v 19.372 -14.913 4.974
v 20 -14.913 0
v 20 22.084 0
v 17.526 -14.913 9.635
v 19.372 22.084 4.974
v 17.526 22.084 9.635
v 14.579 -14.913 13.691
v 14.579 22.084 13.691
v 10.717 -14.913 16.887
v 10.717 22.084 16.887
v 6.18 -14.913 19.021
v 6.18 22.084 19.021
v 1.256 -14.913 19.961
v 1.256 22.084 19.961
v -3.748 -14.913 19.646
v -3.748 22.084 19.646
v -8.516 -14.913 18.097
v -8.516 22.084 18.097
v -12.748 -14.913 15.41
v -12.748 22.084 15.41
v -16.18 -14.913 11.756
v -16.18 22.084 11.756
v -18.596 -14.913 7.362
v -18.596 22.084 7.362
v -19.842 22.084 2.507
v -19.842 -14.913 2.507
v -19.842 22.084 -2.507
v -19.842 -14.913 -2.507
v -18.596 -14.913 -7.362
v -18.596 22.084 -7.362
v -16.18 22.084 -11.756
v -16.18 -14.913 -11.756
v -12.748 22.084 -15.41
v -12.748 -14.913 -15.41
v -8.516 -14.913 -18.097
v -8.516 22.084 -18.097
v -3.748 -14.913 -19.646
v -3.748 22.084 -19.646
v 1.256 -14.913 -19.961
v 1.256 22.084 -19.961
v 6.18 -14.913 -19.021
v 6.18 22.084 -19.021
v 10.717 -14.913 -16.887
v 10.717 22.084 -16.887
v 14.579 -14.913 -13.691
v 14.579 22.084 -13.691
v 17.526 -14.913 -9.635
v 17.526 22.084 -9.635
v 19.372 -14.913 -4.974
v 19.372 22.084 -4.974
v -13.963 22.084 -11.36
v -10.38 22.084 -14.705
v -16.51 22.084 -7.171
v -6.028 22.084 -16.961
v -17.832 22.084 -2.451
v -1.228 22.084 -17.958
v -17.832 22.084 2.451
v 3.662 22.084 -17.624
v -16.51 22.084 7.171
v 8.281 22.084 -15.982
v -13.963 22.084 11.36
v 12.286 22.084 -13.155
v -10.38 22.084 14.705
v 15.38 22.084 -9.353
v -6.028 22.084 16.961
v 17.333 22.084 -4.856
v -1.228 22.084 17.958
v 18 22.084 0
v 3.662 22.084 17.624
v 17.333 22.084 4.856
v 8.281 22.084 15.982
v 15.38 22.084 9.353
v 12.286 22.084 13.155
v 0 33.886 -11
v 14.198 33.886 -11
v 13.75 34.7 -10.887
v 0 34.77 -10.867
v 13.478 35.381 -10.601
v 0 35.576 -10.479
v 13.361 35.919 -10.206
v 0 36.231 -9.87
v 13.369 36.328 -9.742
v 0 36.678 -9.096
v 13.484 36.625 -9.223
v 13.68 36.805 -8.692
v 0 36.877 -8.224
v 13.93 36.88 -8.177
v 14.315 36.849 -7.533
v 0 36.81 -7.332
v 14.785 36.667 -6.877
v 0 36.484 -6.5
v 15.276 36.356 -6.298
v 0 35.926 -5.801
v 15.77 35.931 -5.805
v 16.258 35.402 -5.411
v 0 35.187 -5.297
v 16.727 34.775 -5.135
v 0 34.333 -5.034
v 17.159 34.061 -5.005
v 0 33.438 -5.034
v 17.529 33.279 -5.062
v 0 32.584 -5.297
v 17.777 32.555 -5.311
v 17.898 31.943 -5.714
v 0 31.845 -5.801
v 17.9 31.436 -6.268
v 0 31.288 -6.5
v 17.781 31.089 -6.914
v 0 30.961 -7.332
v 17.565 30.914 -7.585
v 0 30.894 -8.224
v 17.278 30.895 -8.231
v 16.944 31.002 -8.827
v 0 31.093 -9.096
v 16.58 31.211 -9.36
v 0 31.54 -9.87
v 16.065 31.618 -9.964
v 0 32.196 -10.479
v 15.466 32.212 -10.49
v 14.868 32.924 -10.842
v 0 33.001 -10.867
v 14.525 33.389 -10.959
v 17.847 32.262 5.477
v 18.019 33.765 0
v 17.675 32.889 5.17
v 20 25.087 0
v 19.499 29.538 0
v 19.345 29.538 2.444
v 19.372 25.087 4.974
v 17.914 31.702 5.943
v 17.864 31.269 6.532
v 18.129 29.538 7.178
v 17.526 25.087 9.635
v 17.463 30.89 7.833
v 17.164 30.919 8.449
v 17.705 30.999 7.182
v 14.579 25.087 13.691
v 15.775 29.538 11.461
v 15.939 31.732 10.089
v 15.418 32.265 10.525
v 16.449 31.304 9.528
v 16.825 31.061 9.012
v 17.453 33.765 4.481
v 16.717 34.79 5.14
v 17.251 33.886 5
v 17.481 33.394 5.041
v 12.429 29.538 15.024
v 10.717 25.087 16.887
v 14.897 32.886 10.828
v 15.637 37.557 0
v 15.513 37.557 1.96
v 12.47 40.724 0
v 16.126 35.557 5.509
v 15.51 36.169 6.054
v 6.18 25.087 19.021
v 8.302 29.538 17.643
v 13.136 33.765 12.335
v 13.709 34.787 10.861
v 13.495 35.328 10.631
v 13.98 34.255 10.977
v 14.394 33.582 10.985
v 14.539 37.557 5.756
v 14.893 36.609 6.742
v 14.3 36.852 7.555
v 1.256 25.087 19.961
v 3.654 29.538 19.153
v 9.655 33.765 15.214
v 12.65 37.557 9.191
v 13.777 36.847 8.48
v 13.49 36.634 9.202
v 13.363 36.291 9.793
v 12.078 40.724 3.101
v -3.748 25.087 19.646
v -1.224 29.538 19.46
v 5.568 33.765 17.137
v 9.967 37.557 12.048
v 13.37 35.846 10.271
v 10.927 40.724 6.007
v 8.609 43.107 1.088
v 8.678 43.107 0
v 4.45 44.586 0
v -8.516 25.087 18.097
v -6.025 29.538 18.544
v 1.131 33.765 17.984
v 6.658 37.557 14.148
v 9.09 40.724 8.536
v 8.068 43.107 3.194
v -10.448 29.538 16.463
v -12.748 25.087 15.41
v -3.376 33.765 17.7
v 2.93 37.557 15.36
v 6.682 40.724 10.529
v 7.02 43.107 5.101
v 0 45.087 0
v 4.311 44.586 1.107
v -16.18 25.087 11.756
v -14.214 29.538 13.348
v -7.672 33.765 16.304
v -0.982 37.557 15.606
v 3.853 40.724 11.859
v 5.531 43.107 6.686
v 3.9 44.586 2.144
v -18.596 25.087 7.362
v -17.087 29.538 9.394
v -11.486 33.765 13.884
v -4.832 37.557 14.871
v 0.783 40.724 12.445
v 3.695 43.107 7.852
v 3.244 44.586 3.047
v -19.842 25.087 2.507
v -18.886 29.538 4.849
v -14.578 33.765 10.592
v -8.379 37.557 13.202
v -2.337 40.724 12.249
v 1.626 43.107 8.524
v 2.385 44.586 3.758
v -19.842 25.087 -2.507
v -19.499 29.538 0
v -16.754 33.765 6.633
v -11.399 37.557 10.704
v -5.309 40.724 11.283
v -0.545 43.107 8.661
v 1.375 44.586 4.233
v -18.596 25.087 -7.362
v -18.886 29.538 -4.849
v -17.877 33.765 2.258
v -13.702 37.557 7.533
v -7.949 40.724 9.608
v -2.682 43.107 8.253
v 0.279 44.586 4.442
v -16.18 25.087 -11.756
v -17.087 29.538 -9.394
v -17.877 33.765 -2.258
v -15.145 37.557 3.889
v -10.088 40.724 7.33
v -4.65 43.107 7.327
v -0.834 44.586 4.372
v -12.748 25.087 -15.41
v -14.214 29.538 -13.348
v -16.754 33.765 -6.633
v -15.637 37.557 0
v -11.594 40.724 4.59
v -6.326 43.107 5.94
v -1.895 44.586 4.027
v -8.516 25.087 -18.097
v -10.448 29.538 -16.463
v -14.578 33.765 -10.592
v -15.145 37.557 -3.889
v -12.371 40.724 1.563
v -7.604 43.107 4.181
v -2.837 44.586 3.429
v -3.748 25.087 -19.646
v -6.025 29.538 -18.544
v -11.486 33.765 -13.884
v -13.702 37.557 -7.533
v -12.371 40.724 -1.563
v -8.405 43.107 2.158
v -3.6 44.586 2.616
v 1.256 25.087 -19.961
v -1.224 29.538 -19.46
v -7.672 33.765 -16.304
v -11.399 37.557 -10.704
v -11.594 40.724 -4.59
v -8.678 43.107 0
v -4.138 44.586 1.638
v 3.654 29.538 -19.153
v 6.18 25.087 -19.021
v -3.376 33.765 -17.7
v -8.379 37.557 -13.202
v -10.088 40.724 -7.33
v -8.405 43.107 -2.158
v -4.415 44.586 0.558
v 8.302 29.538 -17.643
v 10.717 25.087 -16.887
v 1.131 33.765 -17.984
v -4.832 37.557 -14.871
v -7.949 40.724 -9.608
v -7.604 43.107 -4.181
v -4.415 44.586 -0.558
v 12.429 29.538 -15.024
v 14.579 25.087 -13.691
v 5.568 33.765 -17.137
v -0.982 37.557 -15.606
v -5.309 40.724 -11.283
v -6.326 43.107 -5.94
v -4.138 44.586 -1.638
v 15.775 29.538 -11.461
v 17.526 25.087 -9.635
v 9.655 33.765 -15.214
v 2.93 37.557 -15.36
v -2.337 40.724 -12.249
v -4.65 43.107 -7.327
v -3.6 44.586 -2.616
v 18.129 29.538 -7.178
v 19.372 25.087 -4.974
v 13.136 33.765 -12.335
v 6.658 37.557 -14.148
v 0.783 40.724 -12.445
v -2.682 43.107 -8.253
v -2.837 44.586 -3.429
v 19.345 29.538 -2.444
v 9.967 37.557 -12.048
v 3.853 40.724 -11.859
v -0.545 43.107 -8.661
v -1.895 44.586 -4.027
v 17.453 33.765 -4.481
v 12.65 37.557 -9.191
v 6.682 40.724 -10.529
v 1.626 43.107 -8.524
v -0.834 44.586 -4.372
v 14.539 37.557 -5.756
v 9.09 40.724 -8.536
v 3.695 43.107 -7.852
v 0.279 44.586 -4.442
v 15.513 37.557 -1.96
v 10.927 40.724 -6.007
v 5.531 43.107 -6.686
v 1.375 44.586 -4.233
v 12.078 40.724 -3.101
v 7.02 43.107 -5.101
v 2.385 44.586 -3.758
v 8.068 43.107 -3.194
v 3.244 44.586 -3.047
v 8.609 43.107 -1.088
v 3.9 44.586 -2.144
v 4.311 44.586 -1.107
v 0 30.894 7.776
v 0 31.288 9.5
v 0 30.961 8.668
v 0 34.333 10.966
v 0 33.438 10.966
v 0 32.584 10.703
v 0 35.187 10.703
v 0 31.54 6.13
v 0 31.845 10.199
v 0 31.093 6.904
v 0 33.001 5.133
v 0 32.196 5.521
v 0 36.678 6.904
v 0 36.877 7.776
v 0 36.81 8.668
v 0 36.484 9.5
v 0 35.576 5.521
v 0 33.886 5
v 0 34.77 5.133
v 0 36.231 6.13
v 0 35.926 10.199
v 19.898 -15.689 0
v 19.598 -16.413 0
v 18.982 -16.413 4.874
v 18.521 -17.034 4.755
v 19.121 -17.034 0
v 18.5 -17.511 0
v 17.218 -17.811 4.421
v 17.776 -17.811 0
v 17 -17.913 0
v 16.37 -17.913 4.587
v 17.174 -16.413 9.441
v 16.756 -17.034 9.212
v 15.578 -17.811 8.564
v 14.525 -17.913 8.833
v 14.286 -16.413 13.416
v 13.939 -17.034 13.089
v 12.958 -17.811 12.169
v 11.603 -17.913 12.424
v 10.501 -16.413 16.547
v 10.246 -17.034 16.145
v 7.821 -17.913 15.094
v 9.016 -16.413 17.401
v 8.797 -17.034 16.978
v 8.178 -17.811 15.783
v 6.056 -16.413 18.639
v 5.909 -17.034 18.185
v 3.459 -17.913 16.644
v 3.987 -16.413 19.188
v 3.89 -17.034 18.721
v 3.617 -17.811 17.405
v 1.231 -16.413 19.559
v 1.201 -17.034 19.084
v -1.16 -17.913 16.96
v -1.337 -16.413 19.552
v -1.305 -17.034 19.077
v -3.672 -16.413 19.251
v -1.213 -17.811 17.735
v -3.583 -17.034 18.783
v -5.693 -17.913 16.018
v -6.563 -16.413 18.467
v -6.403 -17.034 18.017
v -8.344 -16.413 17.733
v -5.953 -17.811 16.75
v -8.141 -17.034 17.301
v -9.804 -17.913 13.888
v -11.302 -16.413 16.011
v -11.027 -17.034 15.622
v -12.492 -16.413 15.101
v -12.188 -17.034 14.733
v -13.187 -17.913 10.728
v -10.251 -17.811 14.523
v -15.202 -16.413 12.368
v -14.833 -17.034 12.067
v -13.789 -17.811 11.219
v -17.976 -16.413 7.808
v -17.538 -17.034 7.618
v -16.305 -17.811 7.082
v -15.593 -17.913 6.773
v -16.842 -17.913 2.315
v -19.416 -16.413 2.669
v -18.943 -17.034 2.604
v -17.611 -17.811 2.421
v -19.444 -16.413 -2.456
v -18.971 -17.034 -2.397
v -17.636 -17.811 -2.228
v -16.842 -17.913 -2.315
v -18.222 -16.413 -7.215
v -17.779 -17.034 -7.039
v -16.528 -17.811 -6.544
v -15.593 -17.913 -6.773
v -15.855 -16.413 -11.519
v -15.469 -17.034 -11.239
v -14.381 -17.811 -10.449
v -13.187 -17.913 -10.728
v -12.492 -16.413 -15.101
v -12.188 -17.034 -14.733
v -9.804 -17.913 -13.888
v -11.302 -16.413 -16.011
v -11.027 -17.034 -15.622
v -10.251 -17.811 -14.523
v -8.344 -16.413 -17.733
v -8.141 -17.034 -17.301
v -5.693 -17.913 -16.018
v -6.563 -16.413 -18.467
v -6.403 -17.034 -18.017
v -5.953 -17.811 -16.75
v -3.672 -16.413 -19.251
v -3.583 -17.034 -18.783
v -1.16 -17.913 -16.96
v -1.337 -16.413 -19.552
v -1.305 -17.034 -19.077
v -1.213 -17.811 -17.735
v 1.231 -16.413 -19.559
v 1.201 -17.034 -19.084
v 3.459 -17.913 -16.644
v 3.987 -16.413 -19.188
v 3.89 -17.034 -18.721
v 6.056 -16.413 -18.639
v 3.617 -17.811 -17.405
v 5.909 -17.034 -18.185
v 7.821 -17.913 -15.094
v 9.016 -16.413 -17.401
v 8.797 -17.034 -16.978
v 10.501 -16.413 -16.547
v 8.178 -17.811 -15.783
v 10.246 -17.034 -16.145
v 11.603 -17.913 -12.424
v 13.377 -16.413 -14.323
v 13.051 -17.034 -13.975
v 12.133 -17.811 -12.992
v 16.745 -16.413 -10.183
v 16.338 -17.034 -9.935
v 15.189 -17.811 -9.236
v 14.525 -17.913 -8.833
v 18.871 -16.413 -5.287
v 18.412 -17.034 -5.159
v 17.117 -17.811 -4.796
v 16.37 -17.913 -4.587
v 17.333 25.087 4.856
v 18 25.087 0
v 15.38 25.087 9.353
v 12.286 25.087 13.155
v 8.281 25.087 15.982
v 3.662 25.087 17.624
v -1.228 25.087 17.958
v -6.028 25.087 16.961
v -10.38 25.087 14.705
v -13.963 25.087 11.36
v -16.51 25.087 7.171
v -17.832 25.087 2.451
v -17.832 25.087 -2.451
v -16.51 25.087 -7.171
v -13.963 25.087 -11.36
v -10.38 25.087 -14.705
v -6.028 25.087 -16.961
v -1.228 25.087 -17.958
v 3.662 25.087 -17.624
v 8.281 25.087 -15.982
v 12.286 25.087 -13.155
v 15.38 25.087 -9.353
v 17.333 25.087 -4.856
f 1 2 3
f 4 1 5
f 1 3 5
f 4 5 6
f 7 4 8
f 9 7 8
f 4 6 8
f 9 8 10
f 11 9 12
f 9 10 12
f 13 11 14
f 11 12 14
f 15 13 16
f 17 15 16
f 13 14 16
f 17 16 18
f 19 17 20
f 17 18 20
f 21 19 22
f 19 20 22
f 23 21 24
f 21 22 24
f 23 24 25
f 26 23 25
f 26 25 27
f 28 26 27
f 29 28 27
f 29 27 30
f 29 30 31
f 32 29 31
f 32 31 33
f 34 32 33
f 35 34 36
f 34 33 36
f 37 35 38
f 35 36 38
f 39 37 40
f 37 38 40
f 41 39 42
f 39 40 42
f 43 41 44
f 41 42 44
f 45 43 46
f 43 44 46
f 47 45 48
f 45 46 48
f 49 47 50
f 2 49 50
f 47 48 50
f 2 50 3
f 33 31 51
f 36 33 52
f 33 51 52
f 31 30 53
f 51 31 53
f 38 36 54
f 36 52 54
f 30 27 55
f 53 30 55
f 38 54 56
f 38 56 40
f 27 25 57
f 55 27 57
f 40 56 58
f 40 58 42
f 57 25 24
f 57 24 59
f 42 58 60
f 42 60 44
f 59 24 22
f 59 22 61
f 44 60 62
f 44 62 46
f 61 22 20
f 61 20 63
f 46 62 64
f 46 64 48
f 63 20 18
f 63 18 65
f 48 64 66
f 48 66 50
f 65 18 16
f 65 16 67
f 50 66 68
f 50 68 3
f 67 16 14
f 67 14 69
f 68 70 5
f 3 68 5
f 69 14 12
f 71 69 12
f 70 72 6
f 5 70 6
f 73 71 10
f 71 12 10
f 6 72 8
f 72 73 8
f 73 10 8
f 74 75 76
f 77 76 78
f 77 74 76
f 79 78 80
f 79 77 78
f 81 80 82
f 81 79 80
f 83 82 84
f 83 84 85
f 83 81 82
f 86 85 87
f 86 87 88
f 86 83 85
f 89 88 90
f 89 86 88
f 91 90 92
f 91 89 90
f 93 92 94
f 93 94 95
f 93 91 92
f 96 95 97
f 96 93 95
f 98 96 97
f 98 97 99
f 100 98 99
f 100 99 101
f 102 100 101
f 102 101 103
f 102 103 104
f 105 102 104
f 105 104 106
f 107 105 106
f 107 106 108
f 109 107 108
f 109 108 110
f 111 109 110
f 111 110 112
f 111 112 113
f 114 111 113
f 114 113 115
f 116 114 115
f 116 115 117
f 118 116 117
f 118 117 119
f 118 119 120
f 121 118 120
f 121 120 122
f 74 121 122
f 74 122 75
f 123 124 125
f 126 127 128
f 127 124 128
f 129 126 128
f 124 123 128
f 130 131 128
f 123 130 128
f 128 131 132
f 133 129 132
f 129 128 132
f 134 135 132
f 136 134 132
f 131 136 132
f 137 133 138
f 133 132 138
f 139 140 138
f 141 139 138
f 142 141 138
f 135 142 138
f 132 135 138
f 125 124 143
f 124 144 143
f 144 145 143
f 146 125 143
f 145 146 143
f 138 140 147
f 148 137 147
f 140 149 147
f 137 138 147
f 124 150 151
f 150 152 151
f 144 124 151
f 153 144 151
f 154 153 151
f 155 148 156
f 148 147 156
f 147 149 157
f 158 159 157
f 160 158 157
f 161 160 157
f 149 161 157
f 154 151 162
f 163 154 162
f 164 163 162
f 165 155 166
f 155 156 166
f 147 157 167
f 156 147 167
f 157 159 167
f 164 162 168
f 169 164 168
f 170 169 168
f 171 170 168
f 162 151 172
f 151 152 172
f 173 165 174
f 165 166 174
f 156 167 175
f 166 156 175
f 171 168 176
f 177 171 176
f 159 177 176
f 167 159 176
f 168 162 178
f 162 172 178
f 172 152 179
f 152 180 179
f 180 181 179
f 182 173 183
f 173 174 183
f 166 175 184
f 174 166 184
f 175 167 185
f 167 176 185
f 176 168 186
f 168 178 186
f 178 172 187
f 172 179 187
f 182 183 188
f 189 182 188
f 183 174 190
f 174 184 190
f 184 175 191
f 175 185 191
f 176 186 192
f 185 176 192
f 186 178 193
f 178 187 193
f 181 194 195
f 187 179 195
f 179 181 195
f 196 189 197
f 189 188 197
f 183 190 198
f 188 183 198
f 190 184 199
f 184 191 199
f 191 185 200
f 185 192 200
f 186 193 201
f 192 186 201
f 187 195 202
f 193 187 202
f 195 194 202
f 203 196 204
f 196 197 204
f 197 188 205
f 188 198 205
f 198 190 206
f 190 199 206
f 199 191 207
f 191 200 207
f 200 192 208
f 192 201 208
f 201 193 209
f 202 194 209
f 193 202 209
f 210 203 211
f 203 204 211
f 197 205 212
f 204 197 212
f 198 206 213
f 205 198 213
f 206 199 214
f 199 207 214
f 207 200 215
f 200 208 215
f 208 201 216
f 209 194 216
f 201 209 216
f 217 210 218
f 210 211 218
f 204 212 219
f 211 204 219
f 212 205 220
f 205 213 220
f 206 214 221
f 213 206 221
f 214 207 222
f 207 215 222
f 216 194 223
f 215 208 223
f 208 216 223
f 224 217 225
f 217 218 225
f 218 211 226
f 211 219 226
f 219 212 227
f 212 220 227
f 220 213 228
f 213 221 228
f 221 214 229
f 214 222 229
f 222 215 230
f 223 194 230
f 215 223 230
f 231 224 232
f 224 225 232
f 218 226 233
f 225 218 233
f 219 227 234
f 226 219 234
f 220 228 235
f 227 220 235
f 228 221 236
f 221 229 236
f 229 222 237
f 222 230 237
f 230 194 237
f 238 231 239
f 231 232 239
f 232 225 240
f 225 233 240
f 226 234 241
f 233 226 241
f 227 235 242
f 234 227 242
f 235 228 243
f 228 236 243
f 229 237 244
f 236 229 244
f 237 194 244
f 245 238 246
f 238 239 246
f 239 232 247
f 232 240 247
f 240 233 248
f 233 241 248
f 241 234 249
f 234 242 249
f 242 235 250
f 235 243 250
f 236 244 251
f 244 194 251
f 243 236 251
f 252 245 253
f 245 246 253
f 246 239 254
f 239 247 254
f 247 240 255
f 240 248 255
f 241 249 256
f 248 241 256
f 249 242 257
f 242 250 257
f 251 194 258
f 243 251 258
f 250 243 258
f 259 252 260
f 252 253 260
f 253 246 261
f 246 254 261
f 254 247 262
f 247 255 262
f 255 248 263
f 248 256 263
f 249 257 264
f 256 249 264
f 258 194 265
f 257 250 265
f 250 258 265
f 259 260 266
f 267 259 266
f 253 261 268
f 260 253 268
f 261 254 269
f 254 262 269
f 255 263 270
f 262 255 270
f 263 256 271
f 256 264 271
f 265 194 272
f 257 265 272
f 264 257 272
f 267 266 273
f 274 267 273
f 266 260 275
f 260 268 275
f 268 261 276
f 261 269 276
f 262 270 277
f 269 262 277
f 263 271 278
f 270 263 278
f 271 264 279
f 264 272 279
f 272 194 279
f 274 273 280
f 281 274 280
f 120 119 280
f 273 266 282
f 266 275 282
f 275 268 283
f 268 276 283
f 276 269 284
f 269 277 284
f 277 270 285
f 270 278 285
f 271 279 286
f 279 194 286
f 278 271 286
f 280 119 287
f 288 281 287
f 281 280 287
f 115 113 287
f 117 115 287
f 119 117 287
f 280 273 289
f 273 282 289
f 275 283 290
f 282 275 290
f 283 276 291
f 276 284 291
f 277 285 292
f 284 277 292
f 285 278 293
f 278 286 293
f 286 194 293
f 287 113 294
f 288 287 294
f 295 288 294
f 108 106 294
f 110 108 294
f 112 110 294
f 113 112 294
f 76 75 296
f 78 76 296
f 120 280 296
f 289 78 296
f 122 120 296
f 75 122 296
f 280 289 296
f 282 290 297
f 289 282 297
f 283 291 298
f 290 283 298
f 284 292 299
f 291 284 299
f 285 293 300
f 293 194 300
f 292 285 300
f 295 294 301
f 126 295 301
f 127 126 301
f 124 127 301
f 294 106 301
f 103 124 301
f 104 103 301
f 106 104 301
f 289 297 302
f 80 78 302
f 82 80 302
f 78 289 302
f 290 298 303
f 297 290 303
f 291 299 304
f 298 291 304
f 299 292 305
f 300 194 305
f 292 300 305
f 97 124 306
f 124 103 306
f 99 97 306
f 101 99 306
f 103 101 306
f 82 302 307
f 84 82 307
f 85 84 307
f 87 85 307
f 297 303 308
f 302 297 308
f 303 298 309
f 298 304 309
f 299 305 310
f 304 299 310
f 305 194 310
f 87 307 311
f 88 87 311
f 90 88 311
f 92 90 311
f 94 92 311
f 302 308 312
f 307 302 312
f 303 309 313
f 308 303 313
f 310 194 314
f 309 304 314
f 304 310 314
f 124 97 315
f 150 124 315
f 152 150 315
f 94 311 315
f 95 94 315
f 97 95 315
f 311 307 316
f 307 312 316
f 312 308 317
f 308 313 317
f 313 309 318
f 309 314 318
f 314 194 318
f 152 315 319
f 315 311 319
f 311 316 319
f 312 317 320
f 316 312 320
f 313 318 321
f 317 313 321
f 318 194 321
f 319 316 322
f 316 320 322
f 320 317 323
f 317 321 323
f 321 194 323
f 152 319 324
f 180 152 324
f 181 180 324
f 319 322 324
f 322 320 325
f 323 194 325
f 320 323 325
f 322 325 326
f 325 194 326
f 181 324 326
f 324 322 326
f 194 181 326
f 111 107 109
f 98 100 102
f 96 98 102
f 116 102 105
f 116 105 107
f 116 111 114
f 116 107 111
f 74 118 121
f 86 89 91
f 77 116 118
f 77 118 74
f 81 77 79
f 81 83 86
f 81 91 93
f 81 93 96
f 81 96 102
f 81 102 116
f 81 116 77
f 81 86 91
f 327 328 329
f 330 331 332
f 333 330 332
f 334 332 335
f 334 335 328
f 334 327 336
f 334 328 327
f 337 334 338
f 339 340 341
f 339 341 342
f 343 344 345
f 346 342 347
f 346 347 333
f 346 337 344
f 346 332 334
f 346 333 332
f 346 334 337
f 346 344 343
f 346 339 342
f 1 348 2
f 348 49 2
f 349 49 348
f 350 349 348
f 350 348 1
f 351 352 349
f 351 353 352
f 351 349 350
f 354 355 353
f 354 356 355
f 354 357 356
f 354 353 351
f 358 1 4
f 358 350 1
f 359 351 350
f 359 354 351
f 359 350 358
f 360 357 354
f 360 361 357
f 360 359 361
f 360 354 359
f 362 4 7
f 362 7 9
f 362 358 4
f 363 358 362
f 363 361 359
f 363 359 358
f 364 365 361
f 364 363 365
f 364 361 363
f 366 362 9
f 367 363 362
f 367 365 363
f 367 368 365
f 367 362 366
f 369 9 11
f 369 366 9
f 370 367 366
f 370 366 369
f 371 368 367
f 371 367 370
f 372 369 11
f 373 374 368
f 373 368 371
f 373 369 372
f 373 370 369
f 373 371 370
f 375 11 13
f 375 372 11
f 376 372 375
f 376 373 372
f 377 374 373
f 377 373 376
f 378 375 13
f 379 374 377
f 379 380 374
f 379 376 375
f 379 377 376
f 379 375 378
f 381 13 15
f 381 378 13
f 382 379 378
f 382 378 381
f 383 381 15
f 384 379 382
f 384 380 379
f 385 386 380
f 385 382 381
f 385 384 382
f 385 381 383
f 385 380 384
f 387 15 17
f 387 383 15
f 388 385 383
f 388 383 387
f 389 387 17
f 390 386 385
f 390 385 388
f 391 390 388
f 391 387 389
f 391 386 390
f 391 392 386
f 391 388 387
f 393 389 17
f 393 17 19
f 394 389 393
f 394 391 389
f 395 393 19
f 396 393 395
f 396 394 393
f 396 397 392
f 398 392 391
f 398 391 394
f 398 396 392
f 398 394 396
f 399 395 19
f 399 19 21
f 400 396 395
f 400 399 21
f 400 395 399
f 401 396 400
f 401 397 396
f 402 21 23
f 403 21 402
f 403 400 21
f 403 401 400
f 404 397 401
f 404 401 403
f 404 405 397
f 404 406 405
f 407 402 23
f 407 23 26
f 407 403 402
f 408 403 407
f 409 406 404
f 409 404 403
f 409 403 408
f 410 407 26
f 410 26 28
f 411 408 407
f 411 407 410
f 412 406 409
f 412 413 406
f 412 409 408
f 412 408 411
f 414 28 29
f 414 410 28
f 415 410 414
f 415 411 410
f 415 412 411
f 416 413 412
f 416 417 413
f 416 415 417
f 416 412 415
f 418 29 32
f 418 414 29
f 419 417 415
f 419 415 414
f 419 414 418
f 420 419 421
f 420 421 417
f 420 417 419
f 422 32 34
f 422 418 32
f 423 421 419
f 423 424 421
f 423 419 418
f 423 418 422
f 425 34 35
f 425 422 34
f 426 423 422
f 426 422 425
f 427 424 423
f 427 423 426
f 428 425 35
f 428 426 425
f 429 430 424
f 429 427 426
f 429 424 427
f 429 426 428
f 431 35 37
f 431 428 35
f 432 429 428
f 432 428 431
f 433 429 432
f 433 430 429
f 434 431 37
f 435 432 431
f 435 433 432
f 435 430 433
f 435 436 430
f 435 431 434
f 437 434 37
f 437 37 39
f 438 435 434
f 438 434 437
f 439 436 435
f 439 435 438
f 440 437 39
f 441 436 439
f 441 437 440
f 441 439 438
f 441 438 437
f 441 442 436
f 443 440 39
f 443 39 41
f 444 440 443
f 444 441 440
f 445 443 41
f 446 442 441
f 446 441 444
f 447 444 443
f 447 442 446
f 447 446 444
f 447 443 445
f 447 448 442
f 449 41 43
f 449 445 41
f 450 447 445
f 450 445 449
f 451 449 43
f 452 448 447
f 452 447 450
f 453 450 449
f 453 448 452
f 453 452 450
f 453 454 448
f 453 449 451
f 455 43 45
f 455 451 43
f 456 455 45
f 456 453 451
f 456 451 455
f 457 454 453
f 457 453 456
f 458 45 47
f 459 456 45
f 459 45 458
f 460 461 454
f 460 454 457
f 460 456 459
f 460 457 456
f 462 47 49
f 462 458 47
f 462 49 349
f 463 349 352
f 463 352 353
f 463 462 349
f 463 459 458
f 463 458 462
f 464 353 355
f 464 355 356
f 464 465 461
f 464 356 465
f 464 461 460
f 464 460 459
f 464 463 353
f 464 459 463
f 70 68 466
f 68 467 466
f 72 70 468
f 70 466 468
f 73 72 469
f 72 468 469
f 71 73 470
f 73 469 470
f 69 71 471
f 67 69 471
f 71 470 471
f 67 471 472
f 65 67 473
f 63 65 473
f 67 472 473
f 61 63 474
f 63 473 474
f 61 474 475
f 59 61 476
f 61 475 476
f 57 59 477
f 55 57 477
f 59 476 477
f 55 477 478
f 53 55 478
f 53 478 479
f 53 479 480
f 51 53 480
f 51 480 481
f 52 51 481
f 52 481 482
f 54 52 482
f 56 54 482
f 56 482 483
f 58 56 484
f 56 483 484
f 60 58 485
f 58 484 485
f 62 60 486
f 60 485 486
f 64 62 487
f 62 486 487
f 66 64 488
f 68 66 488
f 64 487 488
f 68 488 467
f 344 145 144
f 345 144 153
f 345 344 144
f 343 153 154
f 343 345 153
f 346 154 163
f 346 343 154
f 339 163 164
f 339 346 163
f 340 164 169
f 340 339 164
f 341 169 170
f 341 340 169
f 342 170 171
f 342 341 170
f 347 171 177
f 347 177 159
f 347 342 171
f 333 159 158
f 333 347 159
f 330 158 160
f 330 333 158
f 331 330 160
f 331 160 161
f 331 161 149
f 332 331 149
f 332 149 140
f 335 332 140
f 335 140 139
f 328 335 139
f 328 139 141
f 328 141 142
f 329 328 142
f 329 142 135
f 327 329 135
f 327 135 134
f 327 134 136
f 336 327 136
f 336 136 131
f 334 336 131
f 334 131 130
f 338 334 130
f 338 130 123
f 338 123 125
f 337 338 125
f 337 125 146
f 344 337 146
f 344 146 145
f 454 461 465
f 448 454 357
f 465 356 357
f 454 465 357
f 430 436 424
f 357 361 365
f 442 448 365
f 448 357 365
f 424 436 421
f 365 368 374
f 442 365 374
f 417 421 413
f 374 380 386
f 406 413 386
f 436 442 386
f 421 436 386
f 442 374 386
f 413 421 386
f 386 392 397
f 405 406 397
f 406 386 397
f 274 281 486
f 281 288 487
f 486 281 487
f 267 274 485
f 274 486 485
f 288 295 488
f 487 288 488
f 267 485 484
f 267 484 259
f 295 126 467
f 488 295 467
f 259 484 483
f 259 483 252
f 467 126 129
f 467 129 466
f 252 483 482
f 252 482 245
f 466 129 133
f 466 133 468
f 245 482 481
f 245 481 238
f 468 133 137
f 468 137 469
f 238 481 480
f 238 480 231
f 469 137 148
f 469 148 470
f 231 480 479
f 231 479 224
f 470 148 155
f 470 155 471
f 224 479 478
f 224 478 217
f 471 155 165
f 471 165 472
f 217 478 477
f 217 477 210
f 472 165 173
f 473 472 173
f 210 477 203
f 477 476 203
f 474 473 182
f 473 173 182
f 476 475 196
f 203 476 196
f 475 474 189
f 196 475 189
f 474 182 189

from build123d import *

# Parameters (mm, degrees)
REDONDEO3_R           = 3
CROQUIS9_R            = 3
CORTAR_EXTRUIR3_DEPTH = 18


with BuildPart() as part:
    # Croquis4 → Revolución4 (revolve)
    with BuildSketch(Plane.XY):
        with BuildLine():
            Line((20, -17.912835745), (20, 22.083900585))
            Line((20, 22.083900585), (18, 22.083900585))
            Line((18, 22.083900585), (18, 25.087164255))
            Line((18, 25.087164255), (20, 25.087164255))
            ThreePointArc((20, 25.087164255), (14.142135624, 39.229299878), (0, 45.087164255))
            Line((0, 45.087164255), (0, -17.912835745))
            Line((0, -17.912835745), (20, -17.912835745))
        make_face()
    revolve(axis=Axis((0, 45.087164255, 0), (0, -1, 0)))

    # Redondeo3
    redondeo3_edges = [part.edges().sort_by_distance(p)[0] for p in [
        (-20, -17.912835745, 0),
    ]]
    fillet(redondeo3_edges, radius=REDONDEO3_R)

    # Croquis9 → Cortar-Extruir3 (cut)
    with BuildSketch(Plane(origin=(0, 0, 0), x_dir=(0, 0, -1), z_dir=(1, 0, 0))):
        with Locations((8, 33.885616094)):
            Circle(CROQUIS9_R)
        with Locations((-8, 33.885616094)):
            Circle(CROQUIS9_R)
    extrude(amount=CORTAR_EXTRUIR3_DEPTH, mode=Mode.SUBTRACT)


solid = part.part
